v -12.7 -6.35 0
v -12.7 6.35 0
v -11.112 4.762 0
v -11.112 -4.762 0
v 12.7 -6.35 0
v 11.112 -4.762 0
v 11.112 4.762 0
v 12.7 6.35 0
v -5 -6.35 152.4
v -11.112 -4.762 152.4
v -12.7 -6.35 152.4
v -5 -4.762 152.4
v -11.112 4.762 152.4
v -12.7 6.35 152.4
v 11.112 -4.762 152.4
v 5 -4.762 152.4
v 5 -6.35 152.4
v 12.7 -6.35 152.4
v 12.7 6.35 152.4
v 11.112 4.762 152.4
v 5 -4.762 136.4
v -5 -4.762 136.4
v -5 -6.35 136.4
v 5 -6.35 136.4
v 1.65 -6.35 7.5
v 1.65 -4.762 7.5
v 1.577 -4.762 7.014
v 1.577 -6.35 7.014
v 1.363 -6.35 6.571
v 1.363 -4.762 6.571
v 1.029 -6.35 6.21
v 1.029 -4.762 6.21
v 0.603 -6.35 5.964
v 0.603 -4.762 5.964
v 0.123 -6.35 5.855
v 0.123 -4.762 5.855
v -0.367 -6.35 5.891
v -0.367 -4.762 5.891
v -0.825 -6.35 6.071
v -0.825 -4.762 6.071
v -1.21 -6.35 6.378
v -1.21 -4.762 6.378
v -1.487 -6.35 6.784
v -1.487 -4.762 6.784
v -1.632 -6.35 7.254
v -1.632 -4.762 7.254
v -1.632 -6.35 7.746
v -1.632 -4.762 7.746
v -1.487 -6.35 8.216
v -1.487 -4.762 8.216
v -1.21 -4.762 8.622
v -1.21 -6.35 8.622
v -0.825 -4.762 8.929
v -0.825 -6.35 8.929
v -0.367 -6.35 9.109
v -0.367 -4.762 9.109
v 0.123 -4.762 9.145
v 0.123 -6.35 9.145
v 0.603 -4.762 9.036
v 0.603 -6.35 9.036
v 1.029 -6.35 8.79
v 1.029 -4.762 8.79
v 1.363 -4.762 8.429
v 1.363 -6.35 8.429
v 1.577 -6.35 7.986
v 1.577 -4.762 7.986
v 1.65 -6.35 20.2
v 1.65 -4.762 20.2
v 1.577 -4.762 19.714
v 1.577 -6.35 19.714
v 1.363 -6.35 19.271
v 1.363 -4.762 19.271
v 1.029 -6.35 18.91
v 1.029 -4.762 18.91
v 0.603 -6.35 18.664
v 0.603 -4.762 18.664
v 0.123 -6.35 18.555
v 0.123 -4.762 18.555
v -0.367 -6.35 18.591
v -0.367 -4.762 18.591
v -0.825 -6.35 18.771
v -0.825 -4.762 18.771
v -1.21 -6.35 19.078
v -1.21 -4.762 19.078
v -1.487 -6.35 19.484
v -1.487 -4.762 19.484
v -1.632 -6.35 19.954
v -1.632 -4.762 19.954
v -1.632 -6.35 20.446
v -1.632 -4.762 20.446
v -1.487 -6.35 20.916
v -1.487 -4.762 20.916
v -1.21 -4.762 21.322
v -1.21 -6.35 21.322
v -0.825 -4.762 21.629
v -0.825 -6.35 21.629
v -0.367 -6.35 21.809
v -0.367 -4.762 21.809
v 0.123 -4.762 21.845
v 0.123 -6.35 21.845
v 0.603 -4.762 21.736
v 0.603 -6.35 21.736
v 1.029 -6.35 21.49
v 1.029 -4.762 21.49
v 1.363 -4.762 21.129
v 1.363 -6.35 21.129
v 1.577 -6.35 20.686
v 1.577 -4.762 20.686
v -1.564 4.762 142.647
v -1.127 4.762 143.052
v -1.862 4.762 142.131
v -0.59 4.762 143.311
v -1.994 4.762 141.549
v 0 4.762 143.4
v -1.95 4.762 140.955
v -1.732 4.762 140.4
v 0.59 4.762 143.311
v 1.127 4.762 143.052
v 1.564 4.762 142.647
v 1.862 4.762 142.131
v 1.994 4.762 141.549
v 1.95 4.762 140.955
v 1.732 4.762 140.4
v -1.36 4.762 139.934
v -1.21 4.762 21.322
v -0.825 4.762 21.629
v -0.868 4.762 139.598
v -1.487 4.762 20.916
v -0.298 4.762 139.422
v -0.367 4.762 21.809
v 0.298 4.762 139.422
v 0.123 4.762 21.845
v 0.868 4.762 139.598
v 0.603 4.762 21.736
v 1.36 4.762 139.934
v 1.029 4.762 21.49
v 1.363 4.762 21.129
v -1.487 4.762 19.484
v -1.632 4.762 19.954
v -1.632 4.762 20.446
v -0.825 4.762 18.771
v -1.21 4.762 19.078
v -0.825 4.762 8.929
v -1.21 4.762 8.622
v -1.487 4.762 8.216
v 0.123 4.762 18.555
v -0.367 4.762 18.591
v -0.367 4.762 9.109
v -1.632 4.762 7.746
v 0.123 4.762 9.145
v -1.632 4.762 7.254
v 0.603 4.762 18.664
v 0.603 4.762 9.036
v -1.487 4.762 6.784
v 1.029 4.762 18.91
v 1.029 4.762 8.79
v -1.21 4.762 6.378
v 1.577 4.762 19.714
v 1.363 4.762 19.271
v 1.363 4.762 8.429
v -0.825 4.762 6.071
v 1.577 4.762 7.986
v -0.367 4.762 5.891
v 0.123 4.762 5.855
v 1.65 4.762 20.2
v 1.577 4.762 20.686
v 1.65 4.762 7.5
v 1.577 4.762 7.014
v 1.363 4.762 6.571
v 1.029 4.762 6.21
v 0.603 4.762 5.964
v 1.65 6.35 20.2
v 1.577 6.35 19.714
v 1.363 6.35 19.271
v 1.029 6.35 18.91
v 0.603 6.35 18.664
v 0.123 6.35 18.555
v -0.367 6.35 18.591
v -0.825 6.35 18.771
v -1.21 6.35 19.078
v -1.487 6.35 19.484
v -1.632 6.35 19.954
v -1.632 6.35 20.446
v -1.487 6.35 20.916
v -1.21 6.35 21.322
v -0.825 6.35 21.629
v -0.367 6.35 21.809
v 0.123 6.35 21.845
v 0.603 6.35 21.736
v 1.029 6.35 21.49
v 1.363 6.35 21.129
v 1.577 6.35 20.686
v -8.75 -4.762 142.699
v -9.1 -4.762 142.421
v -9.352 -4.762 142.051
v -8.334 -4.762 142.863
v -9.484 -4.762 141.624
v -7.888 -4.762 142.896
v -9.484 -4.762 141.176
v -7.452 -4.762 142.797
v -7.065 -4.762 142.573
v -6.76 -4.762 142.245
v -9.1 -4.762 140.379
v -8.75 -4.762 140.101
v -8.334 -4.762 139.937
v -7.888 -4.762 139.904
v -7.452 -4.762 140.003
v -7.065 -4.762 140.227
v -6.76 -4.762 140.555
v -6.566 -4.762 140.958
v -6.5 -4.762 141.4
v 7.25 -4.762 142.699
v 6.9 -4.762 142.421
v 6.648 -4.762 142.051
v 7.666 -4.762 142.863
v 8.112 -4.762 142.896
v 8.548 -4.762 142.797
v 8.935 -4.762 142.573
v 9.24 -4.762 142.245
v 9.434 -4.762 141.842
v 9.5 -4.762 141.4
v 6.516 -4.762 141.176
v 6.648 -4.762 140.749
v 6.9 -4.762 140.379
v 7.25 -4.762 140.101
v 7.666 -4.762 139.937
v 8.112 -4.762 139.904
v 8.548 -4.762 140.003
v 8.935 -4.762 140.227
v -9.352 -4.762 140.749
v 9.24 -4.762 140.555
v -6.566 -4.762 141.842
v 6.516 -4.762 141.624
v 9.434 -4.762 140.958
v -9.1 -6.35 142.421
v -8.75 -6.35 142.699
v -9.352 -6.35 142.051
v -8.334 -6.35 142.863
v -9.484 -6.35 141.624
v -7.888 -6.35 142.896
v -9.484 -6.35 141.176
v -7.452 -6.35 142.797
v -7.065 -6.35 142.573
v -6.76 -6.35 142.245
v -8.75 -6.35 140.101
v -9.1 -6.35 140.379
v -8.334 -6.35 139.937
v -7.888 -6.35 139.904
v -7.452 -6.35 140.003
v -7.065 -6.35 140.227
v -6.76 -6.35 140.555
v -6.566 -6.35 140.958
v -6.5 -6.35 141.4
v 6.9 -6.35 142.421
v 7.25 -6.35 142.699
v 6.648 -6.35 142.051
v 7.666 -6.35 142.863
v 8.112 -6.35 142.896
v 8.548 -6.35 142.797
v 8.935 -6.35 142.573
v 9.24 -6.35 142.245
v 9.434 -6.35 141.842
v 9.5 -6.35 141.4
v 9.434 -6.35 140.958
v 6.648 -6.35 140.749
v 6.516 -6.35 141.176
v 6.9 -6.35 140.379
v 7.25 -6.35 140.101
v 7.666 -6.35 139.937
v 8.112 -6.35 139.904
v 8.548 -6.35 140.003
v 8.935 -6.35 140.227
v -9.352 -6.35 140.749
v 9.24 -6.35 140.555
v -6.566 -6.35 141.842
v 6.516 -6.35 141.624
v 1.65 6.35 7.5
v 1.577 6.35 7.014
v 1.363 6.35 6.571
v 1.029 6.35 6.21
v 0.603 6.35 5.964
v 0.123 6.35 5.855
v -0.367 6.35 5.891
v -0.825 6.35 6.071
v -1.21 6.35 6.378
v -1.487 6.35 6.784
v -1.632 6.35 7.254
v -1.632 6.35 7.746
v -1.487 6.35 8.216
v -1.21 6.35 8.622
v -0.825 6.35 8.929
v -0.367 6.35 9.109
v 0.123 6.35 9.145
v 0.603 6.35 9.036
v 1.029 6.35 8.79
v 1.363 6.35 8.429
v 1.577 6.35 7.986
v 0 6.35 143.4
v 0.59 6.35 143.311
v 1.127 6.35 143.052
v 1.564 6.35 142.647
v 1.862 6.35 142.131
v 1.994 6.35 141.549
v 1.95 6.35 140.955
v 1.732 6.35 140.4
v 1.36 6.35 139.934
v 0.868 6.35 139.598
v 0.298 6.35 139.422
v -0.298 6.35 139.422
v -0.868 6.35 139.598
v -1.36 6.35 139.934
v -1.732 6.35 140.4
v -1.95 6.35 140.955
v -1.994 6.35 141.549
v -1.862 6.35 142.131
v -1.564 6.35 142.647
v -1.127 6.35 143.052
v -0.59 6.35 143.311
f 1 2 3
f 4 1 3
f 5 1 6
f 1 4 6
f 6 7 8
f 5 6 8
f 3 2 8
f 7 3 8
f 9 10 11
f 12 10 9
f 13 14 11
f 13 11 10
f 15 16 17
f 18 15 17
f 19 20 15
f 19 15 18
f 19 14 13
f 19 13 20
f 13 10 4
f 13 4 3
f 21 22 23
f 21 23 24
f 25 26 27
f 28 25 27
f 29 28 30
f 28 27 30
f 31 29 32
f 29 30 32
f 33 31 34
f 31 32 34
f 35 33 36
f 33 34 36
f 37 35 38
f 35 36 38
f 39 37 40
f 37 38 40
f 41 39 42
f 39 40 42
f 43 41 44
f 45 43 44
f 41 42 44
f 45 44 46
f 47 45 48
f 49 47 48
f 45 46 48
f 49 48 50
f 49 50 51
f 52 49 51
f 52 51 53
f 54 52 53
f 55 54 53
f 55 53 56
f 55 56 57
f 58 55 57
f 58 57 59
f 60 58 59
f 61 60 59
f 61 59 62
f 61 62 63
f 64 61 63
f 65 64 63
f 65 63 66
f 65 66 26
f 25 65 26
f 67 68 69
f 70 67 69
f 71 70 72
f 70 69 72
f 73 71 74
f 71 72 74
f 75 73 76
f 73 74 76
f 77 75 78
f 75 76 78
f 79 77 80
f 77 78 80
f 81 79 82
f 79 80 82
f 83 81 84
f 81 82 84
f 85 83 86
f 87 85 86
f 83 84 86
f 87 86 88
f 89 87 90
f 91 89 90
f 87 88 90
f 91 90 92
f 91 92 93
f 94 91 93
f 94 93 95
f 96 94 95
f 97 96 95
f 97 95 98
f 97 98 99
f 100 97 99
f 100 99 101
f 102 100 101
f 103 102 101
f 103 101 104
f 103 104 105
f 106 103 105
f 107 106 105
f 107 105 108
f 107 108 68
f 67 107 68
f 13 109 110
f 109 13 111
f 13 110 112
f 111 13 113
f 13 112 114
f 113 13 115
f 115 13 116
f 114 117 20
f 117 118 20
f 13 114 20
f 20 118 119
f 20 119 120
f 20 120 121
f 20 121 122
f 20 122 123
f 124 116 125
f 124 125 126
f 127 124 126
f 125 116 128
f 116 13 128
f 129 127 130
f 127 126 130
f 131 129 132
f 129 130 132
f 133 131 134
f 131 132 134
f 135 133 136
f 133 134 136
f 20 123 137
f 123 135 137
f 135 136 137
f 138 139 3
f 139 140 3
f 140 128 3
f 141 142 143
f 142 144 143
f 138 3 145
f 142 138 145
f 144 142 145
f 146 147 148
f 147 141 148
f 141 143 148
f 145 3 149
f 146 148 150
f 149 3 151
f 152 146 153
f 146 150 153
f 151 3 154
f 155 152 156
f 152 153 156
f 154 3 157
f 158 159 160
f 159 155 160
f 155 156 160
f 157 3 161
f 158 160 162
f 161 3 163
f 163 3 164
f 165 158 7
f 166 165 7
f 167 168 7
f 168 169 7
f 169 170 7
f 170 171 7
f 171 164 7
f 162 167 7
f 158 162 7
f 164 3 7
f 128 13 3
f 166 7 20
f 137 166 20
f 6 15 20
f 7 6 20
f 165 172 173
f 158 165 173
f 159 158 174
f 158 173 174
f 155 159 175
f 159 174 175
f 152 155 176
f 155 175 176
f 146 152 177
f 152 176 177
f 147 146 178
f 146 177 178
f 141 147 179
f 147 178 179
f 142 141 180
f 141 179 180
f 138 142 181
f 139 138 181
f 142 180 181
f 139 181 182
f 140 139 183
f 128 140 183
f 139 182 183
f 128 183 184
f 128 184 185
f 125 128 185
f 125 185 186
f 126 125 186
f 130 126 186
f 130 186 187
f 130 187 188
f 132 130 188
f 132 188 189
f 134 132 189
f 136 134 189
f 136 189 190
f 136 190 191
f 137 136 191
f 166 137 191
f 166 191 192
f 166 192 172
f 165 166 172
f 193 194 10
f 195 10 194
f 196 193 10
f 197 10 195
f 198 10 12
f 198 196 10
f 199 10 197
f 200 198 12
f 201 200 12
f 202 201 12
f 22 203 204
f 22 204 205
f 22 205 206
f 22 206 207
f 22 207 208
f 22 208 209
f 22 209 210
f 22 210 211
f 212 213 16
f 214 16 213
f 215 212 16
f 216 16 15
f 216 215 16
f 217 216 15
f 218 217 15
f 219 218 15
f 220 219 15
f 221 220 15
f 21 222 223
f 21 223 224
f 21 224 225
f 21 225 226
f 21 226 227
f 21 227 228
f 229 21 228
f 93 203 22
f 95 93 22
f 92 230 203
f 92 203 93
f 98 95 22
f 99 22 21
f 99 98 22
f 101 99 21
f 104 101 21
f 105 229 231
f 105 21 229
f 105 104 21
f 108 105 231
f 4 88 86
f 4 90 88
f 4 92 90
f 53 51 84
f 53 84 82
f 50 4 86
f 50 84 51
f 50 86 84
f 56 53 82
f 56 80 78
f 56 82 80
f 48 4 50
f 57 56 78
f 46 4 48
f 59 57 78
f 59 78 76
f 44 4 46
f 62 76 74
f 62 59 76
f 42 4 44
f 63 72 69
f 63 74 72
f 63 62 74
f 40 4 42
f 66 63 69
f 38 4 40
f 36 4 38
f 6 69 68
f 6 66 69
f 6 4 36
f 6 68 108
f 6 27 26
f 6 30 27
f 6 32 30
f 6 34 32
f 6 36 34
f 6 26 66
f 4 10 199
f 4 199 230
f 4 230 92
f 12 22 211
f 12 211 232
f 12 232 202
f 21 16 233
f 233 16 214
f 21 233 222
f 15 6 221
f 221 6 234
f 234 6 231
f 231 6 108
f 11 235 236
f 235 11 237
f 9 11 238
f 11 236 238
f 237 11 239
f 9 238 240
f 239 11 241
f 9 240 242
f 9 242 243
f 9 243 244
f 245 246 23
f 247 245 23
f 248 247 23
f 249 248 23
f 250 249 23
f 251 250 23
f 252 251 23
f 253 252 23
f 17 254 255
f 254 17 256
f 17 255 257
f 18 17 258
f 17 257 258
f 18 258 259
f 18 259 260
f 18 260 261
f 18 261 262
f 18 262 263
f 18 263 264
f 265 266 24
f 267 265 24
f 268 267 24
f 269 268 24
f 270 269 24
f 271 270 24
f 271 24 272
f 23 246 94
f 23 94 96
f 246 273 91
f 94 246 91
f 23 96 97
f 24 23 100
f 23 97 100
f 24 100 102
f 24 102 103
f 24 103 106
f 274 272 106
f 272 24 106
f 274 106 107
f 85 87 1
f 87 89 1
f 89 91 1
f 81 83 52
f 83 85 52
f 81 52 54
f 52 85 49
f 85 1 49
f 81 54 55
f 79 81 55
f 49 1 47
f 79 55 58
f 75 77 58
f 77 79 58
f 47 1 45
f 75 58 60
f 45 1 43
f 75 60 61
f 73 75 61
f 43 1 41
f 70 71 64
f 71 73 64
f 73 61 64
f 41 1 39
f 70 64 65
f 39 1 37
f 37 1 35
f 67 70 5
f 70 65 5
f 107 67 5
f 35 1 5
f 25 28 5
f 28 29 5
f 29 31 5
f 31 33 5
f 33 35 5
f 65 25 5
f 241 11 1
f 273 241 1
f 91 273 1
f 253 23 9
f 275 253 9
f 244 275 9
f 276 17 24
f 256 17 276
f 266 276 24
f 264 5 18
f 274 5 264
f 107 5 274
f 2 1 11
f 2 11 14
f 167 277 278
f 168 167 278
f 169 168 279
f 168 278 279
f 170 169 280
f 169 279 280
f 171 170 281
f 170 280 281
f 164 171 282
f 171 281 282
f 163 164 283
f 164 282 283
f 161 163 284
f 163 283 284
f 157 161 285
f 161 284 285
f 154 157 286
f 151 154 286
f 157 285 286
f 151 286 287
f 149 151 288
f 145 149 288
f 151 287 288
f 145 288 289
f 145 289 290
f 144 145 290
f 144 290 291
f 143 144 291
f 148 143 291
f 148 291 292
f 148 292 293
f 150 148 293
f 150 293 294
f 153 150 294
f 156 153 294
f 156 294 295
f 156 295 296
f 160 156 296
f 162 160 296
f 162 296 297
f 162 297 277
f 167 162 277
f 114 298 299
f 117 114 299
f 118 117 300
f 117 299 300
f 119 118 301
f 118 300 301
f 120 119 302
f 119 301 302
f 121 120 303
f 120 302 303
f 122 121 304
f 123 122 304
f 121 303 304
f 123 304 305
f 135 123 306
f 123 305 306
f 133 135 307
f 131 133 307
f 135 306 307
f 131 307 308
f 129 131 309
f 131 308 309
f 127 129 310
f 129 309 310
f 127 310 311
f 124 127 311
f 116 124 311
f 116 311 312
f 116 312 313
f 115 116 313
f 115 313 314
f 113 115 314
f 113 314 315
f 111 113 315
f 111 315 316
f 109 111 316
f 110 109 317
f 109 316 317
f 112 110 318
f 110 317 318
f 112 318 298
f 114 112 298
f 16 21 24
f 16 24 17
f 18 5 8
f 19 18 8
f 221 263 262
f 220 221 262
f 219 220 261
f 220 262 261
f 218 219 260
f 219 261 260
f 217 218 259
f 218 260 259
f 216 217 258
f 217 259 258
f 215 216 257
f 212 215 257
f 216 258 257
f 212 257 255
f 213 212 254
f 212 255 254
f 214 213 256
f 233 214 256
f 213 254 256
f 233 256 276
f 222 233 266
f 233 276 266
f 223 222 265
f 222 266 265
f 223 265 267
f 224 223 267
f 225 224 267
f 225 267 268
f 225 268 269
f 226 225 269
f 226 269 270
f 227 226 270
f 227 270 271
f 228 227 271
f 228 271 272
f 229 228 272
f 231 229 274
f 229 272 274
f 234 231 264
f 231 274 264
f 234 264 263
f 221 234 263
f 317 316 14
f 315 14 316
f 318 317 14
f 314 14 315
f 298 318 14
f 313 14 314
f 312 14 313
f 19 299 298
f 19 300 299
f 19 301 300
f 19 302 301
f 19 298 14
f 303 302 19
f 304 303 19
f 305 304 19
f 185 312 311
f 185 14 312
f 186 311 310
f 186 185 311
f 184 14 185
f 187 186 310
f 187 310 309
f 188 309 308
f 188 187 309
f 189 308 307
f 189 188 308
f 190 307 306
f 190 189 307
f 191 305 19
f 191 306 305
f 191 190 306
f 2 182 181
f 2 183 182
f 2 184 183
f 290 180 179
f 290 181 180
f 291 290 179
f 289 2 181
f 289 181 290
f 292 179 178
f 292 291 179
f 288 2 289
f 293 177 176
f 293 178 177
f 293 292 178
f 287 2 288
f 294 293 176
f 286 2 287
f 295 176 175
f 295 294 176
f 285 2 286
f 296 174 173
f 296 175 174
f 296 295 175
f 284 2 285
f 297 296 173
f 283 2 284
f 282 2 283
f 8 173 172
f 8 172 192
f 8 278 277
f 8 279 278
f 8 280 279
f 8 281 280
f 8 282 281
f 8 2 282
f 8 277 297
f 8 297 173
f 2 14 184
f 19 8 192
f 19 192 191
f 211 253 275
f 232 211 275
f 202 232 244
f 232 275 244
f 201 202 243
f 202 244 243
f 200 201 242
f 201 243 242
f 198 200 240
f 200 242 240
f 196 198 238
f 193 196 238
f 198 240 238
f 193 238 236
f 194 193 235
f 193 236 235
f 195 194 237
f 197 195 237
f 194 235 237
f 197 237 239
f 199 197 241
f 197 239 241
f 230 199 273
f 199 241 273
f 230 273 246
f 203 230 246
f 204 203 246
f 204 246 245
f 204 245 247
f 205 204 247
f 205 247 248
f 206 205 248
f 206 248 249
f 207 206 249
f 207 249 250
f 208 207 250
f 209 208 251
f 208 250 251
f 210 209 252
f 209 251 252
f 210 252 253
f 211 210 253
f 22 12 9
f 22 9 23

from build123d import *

# Parameters (mm, degrees)
SKETCH3_W               = 25.4
SKETCH3_H               = 12.7
SKETCH3_W_2             = 22.225
SKETCH3_H_2             = 9.525
BOSS_EXTRUDE1_DEPTH     = 152.4
SKETCH4_R               = 2
CUT_EXTRUDE1_DEPTH      = 1.5875
SKETCH5_R               = 1.500419334
CUT_EXTRUDE2_DEPTH      = 1.5875
CUT_EXTRUDE3_DEPTH      = 154.454683865
CUT_EXTRUDE3_DEPTH_BACK = 2.54
M4X0_7_TAPPED_HOLE1_D   = 3.3


with BuildPart() as part:
    # Sketch3 → Boss-Extrude1 (new body)
    with BuildSketch(Plane.XY):
        Rectangle(SKETCH3_W, SKETCH3_H)
        Rectangle(SKETCH3_W_2, SKETCH3_H_2, mode=Mode.SUBTRACT)
    extrude(amount=BOSS_EXTRUDE1_DEPTH)

    # Sketch4 → Cut-Extrude1 (cut)
    with BuildSketch(Plane(origin=(0, 6.35, 0), x_dir=(1, 0, 0), z_dir=(0, 1, 0))):
        with Locations(Location((0, -141.4, 0), (0, 0, 270))):
            Circle(SKETCH4_R)
    extrude(amount=-CUT_EXTRUDE1_DEPTH, mode=Mode.SUBTRACT)

    # Sketch5 → Cut-Extrude2 (cut)
    with BuildSketch(Plane.XZ.offset(6.35)):
        with Locations((-8, 141.4)):
            Circle(SKETCH5_R)
        with Locations((0, 149.4)):
            Circle(SKETCH5_R)
        with Locations((8, 141.4)):
            Circle(SKETCH5_R)
    extrude(amount=-CUT_EXTRUDE2_DEPTH, mode=Mode.SUBTRACT)

    # Sketch6 → Cut-Extrude3 (cut, two sides: drawn at the far end of the back side and taken through both)
    with BuildSketch(Plane.XZ.offset(6.35).offset(-CUT_EXTRUDE3_DEPTH_BACK)):
        Polygon((-5, 469.248822712), (-5, 152.4), (-5, 136.4), (5, 136.4), (5, 152.4), (5, 469.248822712), (5, 1102.946468137), (-5, 1102.946468137), align=None)
    extrude(amount=CUT_EXTRUDE3_DEPTH + CUT_EXTRUDE3_DEPTH_BACK, mode=Mode.SUBTRACT)

    # M4x0.7 Tapped Hole1 (through all)
    with Locations(Plane(origin=(0, -6.35, 0), x_dir=(-1, 0, 0), z_dir=(0, -1, 0))):
        with Locations((0, -20.199999986), (0, -7.5)):
            Hole(M4X0_7_TAPPED_HOLE1_D / 2)


solid = part.part
